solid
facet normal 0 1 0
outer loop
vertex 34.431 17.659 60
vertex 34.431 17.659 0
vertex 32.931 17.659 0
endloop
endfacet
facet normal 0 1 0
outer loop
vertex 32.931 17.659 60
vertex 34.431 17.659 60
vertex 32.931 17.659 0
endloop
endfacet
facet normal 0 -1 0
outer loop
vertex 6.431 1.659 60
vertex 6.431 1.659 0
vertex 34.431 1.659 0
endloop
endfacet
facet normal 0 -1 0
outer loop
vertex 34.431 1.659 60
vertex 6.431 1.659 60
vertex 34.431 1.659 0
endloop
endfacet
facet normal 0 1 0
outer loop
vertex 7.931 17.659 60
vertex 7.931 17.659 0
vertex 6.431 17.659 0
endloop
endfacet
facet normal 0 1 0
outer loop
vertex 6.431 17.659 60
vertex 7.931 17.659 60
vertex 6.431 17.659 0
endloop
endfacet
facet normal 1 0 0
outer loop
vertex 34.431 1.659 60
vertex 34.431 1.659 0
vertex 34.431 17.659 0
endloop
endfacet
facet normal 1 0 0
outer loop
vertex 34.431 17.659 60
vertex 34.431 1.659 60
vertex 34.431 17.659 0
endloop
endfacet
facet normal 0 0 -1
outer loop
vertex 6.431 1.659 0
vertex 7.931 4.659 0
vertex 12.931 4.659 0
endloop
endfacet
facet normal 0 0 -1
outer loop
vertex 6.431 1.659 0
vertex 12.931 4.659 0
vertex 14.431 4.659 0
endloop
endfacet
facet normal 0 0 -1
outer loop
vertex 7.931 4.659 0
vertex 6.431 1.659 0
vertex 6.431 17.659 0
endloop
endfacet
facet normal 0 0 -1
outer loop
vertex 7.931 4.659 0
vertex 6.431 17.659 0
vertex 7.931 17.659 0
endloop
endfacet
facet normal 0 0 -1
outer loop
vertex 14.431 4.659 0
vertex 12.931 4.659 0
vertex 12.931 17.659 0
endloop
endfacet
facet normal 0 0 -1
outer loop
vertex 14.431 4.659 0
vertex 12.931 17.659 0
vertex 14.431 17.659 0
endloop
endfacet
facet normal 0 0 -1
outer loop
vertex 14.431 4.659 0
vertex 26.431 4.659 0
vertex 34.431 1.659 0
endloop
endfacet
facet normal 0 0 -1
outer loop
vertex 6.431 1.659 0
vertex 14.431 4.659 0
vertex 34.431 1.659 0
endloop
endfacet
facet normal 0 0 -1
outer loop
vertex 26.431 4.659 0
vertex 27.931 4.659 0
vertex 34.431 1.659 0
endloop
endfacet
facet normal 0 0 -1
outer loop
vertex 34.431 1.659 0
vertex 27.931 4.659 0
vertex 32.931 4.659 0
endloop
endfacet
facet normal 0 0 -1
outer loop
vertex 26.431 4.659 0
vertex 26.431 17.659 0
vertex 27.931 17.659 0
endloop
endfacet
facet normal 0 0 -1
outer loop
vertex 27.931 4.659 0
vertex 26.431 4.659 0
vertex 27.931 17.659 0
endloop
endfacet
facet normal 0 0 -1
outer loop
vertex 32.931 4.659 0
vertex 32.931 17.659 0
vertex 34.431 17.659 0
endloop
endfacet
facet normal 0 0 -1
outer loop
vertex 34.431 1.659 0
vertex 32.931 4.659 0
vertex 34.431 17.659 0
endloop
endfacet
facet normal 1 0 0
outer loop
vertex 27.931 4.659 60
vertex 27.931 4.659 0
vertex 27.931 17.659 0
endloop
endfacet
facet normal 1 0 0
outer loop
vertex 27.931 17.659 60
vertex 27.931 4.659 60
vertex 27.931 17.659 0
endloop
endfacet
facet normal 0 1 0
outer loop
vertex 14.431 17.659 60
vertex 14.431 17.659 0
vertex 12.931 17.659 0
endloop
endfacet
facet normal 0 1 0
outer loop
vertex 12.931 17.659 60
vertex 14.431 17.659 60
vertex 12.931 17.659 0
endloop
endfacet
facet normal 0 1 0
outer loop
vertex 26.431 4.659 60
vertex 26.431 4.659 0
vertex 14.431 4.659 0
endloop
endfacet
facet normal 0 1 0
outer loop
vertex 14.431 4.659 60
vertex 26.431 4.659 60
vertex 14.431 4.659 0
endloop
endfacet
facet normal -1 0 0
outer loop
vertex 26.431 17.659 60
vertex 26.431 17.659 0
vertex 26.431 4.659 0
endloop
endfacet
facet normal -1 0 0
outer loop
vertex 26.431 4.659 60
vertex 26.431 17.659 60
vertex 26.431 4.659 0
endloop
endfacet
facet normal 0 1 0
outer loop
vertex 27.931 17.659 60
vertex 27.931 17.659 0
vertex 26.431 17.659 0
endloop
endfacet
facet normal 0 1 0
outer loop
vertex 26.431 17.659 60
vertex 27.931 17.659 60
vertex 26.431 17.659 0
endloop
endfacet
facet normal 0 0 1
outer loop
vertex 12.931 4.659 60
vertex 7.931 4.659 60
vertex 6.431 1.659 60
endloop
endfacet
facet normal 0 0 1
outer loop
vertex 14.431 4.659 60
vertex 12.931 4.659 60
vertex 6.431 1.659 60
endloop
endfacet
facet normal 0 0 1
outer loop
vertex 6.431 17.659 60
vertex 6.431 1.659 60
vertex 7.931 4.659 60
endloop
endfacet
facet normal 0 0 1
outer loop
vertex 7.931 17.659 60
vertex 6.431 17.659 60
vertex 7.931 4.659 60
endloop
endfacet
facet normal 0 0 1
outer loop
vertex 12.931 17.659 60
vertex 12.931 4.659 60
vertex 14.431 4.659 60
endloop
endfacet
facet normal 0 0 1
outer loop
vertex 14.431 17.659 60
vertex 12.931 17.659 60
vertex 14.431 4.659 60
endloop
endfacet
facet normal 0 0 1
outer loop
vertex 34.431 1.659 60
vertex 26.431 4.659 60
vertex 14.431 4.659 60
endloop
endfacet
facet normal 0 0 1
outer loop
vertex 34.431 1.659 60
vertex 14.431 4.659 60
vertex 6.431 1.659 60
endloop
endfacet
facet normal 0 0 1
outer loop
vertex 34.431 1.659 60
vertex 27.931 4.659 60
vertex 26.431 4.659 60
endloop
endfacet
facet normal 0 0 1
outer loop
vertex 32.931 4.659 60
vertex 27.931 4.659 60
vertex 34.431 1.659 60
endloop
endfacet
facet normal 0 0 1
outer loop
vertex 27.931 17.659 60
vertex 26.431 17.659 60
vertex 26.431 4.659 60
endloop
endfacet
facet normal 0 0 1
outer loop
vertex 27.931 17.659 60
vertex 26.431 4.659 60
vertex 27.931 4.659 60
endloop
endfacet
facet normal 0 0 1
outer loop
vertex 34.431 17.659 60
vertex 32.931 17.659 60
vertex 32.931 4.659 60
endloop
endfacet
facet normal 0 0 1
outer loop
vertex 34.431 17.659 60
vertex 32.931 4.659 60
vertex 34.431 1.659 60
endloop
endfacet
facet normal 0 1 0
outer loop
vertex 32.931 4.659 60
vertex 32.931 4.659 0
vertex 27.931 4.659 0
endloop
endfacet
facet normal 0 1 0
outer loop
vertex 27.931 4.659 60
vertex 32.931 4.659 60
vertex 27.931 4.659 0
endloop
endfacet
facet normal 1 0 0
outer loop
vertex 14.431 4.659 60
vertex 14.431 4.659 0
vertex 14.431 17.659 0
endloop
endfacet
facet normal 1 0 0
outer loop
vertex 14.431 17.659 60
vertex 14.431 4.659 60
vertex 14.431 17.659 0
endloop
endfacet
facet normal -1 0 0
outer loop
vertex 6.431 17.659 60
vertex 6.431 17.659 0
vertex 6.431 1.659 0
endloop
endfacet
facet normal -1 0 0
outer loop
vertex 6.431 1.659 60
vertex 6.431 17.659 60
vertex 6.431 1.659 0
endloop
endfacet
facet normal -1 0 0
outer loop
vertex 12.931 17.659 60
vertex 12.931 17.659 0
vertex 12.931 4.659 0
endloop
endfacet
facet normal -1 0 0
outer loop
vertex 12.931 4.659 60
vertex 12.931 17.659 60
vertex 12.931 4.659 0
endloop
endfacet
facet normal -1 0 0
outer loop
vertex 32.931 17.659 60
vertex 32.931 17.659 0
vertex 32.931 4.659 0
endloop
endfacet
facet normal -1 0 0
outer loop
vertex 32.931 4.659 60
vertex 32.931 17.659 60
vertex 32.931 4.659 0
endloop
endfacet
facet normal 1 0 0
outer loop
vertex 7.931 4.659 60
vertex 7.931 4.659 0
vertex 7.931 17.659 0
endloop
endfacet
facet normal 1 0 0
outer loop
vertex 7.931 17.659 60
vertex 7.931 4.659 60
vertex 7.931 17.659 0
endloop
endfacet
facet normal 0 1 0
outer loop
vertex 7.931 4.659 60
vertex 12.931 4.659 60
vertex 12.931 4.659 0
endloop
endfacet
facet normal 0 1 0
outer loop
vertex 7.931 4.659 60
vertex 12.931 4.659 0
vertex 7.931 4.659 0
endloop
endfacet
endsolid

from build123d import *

# Parameters (mm, degrees)
EXTRUDE_DEPTH                     = 60
EXTRUDE_ONTO_WIRE_PLACEMENT_ANGLE = 3.1e-05


with BuildPart() as part:
    # Wire as drawn → Extrude (new)
    with BuildSketch(Plane.XY):
        Polygon((0, 0), (28, 0), (28, 16), (26.5, 16), (26.5, 3), (21.5, 3), (21.5, 16), (20, 16), (20, 3), (8, 3), (8, 16), (6.5, 16), (6.5, 3), (1.5, 3), (1.5, 16), (0, 16), align=None)
    extrude(amount=EXTRUDE_DEPTH)


with BuildPart() as part_1:
    # Extrude onto Wire placement: moved
    add(part.part.moved(Location((6.431091, 1.659197, 0))).rotate(Axis((6.431091, 1.659197, 0), (0, 0, 1)), EXTRUDE_ONTO_WIRE_PLACEMENT_ANGLE))


solid = part_1.part
